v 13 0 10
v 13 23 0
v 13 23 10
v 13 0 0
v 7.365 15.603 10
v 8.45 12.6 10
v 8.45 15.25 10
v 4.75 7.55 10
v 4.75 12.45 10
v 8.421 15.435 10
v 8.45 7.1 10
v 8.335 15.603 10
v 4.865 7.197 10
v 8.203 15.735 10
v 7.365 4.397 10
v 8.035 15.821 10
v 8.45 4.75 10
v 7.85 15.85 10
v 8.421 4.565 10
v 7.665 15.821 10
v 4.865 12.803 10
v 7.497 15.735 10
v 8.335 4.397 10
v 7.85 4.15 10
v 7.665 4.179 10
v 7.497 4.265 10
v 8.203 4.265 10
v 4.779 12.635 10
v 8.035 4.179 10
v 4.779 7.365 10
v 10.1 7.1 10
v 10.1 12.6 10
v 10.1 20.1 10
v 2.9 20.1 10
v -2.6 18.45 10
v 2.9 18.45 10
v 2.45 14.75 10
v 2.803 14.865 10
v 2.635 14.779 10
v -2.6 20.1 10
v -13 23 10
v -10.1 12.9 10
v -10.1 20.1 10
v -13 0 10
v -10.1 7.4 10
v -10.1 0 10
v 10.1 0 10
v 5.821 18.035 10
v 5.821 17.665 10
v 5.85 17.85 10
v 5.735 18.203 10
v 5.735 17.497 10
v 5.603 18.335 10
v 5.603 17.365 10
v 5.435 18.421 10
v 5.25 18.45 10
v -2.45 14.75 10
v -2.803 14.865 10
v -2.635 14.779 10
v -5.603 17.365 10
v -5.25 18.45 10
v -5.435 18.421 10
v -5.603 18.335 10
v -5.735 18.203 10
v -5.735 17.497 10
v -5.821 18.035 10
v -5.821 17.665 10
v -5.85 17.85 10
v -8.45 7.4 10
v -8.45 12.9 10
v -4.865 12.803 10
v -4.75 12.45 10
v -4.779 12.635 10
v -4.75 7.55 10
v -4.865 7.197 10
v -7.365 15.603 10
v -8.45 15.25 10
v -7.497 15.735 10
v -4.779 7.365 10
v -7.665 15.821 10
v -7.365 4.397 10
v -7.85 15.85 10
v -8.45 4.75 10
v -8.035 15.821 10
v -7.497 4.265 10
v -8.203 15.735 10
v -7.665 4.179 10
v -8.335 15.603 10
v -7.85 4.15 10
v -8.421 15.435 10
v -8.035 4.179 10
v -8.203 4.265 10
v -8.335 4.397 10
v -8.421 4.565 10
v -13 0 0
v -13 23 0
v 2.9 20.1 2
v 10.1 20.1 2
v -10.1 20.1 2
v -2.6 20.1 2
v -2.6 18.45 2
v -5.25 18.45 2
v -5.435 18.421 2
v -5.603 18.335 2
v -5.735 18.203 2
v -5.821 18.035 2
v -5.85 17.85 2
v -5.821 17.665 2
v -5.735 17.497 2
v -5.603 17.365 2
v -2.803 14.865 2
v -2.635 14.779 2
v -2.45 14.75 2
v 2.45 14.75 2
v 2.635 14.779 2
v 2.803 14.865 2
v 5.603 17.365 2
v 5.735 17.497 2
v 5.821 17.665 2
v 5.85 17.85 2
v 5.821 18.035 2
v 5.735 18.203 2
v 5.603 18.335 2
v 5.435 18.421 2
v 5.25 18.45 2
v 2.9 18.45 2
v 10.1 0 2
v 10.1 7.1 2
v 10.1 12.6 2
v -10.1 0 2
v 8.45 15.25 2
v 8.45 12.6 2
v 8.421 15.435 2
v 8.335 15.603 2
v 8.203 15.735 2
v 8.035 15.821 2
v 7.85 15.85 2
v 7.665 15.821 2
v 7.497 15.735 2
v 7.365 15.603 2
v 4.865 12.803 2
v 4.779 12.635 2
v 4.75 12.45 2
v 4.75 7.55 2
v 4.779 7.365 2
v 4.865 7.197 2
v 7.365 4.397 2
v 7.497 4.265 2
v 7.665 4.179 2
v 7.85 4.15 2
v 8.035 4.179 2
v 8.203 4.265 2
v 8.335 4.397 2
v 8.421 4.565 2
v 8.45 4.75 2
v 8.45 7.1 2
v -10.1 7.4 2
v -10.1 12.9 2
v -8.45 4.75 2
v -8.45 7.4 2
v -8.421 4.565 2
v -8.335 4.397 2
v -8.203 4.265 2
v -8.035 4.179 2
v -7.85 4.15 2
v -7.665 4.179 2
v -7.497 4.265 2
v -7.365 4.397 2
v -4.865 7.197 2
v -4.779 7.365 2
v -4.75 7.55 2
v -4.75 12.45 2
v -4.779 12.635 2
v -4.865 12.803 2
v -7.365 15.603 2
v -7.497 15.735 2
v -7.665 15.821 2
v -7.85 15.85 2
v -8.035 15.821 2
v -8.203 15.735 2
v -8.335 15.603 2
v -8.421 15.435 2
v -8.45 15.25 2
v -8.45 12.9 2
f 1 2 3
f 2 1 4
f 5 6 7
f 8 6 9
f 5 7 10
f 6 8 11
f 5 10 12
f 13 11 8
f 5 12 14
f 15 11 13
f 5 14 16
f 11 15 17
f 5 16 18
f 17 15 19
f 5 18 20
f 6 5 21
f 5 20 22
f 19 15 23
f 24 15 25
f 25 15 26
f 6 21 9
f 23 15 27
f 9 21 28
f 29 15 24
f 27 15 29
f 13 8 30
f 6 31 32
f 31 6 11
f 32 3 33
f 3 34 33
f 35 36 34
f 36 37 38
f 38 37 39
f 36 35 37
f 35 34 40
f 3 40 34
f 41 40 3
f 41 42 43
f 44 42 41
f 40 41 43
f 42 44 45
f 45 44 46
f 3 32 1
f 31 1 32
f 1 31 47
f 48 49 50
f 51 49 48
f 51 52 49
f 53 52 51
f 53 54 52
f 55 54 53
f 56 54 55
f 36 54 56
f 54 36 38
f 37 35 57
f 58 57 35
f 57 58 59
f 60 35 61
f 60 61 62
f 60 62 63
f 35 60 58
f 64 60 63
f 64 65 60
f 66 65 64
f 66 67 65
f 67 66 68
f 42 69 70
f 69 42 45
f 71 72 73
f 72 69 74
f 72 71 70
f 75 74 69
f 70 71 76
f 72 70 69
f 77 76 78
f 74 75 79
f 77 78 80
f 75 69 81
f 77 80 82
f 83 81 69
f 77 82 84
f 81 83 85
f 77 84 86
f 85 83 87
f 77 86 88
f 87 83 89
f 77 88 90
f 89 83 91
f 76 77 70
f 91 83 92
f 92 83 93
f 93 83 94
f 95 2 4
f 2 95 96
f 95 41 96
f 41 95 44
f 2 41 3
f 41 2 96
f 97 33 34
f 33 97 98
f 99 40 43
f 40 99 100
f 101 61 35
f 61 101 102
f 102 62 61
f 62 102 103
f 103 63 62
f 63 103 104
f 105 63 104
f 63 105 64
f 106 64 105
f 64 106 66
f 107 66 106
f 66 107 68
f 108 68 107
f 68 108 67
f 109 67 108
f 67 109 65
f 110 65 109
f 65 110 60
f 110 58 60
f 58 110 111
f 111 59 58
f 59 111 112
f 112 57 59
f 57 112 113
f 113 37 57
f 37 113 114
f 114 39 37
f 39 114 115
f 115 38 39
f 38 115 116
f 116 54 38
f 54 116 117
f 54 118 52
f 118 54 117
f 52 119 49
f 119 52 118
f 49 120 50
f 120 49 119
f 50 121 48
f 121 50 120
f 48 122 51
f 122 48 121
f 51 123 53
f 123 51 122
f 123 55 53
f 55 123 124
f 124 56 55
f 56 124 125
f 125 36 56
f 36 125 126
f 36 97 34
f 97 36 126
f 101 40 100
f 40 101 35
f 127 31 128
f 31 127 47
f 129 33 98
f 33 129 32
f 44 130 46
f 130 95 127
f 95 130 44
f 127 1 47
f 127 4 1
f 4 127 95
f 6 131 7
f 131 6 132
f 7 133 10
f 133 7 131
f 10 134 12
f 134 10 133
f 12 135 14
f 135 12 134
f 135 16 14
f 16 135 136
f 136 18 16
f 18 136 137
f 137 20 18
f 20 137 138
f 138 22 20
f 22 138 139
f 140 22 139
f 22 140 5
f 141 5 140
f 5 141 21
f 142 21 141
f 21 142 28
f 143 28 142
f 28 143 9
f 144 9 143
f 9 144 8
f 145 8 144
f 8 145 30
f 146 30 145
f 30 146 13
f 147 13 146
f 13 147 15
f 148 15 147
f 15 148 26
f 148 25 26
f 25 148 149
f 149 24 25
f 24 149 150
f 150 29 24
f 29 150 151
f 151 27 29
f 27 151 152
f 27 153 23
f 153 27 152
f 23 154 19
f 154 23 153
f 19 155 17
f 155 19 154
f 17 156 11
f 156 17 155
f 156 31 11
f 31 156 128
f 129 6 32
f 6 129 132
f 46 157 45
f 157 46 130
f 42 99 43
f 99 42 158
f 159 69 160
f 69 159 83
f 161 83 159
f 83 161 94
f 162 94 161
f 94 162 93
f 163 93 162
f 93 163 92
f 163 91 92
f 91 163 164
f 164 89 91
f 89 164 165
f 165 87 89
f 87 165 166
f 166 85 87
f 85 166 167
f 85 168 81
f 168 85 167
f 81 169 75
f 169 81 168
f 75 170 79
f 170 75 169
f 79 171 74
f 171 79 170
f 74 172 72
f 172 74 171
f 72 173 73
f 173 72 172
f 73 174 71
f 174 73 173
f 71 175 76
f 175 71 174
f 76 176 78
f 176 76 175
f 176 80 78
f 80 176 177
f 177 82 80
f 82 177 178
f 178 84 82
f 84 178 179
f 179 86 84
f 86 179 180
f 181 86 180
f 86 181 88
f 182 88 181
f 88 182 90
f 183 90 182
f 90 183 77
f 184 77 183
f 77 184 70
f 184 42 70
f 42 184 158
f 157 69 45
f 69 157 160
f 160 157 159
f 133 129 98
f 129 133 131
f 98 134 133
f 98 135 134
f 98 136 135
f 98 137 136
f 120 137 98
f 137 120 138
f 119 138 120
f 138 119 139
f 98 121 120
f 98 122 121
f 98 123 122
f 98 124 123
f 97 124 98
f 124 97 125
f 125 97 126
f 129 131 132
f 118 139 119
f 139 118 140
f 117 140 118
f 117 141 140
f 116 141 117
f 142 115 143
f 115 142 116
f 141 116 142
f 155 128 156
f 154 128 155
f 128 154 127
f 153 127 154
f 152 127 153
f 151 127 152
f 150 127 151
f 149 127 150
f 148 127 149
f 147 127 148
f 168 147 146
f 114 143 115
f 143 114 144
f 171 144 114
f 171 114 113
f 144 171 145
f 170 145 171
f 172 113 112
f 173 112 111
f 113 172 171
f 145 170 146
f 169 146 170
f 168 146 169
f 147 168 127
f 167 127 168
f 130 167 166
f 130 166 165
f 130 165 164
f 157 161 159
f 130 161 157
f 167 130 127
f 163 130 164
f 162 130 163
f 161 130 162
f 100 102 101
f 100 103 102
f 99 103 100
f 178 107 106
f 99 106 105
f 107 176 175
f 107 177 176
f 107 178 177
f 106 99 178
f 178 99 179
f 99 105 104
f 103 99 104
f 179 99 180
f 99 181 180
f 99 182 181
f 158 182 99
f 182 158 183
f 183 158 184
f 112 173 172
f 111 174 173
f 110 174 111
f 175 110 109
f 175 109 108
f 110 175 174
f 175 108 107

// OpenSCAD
hauteurSupport = 10;
$fn = 20;

translate([-13, 0, 0]) cube([26, 23, 2]);
support();

module support() {
	difference() {
		union() {
			translate([-13, 20.1, 0]) cube([26, 2.9, hauteurSupport]);
			translate([0, 20.1, 0]) rotate(180) fleche();
			translate([10.1, 0, 0]) cube([2.9, 23, hauteurSupport]);
			translate([10.1, 10, 0]) rotate(90) fleche();
			translate([-13, 0, 0]) cube([2.9, 23, hauteurSupport]);
			translate([-10.1, 10, 0]) rotate(-90) fleche();
		}
		translate ([0, 10, 23 ]) rotate([0, 90, 0]) cylinder(h = 50, r = 2, center = true);
	}
}

module fleche() {
	linear_extrude(height = 10, center = false, convexity = 10, twist = 0)
	union() {
		translate([-2.9, 0, 0]) square([5.5, 5]);
		hull() {
			translate([5.25, 2.25, 0]) circle(0.6, true);
			translate([-5.25, 2.25, 0]) circle(0.6, true);
			translate([-2.45, 4.75, 0]) circle(0.6, true);
			translate([2.45, 4.75, 0]) circle(0.6, true);
		}
	}
}
